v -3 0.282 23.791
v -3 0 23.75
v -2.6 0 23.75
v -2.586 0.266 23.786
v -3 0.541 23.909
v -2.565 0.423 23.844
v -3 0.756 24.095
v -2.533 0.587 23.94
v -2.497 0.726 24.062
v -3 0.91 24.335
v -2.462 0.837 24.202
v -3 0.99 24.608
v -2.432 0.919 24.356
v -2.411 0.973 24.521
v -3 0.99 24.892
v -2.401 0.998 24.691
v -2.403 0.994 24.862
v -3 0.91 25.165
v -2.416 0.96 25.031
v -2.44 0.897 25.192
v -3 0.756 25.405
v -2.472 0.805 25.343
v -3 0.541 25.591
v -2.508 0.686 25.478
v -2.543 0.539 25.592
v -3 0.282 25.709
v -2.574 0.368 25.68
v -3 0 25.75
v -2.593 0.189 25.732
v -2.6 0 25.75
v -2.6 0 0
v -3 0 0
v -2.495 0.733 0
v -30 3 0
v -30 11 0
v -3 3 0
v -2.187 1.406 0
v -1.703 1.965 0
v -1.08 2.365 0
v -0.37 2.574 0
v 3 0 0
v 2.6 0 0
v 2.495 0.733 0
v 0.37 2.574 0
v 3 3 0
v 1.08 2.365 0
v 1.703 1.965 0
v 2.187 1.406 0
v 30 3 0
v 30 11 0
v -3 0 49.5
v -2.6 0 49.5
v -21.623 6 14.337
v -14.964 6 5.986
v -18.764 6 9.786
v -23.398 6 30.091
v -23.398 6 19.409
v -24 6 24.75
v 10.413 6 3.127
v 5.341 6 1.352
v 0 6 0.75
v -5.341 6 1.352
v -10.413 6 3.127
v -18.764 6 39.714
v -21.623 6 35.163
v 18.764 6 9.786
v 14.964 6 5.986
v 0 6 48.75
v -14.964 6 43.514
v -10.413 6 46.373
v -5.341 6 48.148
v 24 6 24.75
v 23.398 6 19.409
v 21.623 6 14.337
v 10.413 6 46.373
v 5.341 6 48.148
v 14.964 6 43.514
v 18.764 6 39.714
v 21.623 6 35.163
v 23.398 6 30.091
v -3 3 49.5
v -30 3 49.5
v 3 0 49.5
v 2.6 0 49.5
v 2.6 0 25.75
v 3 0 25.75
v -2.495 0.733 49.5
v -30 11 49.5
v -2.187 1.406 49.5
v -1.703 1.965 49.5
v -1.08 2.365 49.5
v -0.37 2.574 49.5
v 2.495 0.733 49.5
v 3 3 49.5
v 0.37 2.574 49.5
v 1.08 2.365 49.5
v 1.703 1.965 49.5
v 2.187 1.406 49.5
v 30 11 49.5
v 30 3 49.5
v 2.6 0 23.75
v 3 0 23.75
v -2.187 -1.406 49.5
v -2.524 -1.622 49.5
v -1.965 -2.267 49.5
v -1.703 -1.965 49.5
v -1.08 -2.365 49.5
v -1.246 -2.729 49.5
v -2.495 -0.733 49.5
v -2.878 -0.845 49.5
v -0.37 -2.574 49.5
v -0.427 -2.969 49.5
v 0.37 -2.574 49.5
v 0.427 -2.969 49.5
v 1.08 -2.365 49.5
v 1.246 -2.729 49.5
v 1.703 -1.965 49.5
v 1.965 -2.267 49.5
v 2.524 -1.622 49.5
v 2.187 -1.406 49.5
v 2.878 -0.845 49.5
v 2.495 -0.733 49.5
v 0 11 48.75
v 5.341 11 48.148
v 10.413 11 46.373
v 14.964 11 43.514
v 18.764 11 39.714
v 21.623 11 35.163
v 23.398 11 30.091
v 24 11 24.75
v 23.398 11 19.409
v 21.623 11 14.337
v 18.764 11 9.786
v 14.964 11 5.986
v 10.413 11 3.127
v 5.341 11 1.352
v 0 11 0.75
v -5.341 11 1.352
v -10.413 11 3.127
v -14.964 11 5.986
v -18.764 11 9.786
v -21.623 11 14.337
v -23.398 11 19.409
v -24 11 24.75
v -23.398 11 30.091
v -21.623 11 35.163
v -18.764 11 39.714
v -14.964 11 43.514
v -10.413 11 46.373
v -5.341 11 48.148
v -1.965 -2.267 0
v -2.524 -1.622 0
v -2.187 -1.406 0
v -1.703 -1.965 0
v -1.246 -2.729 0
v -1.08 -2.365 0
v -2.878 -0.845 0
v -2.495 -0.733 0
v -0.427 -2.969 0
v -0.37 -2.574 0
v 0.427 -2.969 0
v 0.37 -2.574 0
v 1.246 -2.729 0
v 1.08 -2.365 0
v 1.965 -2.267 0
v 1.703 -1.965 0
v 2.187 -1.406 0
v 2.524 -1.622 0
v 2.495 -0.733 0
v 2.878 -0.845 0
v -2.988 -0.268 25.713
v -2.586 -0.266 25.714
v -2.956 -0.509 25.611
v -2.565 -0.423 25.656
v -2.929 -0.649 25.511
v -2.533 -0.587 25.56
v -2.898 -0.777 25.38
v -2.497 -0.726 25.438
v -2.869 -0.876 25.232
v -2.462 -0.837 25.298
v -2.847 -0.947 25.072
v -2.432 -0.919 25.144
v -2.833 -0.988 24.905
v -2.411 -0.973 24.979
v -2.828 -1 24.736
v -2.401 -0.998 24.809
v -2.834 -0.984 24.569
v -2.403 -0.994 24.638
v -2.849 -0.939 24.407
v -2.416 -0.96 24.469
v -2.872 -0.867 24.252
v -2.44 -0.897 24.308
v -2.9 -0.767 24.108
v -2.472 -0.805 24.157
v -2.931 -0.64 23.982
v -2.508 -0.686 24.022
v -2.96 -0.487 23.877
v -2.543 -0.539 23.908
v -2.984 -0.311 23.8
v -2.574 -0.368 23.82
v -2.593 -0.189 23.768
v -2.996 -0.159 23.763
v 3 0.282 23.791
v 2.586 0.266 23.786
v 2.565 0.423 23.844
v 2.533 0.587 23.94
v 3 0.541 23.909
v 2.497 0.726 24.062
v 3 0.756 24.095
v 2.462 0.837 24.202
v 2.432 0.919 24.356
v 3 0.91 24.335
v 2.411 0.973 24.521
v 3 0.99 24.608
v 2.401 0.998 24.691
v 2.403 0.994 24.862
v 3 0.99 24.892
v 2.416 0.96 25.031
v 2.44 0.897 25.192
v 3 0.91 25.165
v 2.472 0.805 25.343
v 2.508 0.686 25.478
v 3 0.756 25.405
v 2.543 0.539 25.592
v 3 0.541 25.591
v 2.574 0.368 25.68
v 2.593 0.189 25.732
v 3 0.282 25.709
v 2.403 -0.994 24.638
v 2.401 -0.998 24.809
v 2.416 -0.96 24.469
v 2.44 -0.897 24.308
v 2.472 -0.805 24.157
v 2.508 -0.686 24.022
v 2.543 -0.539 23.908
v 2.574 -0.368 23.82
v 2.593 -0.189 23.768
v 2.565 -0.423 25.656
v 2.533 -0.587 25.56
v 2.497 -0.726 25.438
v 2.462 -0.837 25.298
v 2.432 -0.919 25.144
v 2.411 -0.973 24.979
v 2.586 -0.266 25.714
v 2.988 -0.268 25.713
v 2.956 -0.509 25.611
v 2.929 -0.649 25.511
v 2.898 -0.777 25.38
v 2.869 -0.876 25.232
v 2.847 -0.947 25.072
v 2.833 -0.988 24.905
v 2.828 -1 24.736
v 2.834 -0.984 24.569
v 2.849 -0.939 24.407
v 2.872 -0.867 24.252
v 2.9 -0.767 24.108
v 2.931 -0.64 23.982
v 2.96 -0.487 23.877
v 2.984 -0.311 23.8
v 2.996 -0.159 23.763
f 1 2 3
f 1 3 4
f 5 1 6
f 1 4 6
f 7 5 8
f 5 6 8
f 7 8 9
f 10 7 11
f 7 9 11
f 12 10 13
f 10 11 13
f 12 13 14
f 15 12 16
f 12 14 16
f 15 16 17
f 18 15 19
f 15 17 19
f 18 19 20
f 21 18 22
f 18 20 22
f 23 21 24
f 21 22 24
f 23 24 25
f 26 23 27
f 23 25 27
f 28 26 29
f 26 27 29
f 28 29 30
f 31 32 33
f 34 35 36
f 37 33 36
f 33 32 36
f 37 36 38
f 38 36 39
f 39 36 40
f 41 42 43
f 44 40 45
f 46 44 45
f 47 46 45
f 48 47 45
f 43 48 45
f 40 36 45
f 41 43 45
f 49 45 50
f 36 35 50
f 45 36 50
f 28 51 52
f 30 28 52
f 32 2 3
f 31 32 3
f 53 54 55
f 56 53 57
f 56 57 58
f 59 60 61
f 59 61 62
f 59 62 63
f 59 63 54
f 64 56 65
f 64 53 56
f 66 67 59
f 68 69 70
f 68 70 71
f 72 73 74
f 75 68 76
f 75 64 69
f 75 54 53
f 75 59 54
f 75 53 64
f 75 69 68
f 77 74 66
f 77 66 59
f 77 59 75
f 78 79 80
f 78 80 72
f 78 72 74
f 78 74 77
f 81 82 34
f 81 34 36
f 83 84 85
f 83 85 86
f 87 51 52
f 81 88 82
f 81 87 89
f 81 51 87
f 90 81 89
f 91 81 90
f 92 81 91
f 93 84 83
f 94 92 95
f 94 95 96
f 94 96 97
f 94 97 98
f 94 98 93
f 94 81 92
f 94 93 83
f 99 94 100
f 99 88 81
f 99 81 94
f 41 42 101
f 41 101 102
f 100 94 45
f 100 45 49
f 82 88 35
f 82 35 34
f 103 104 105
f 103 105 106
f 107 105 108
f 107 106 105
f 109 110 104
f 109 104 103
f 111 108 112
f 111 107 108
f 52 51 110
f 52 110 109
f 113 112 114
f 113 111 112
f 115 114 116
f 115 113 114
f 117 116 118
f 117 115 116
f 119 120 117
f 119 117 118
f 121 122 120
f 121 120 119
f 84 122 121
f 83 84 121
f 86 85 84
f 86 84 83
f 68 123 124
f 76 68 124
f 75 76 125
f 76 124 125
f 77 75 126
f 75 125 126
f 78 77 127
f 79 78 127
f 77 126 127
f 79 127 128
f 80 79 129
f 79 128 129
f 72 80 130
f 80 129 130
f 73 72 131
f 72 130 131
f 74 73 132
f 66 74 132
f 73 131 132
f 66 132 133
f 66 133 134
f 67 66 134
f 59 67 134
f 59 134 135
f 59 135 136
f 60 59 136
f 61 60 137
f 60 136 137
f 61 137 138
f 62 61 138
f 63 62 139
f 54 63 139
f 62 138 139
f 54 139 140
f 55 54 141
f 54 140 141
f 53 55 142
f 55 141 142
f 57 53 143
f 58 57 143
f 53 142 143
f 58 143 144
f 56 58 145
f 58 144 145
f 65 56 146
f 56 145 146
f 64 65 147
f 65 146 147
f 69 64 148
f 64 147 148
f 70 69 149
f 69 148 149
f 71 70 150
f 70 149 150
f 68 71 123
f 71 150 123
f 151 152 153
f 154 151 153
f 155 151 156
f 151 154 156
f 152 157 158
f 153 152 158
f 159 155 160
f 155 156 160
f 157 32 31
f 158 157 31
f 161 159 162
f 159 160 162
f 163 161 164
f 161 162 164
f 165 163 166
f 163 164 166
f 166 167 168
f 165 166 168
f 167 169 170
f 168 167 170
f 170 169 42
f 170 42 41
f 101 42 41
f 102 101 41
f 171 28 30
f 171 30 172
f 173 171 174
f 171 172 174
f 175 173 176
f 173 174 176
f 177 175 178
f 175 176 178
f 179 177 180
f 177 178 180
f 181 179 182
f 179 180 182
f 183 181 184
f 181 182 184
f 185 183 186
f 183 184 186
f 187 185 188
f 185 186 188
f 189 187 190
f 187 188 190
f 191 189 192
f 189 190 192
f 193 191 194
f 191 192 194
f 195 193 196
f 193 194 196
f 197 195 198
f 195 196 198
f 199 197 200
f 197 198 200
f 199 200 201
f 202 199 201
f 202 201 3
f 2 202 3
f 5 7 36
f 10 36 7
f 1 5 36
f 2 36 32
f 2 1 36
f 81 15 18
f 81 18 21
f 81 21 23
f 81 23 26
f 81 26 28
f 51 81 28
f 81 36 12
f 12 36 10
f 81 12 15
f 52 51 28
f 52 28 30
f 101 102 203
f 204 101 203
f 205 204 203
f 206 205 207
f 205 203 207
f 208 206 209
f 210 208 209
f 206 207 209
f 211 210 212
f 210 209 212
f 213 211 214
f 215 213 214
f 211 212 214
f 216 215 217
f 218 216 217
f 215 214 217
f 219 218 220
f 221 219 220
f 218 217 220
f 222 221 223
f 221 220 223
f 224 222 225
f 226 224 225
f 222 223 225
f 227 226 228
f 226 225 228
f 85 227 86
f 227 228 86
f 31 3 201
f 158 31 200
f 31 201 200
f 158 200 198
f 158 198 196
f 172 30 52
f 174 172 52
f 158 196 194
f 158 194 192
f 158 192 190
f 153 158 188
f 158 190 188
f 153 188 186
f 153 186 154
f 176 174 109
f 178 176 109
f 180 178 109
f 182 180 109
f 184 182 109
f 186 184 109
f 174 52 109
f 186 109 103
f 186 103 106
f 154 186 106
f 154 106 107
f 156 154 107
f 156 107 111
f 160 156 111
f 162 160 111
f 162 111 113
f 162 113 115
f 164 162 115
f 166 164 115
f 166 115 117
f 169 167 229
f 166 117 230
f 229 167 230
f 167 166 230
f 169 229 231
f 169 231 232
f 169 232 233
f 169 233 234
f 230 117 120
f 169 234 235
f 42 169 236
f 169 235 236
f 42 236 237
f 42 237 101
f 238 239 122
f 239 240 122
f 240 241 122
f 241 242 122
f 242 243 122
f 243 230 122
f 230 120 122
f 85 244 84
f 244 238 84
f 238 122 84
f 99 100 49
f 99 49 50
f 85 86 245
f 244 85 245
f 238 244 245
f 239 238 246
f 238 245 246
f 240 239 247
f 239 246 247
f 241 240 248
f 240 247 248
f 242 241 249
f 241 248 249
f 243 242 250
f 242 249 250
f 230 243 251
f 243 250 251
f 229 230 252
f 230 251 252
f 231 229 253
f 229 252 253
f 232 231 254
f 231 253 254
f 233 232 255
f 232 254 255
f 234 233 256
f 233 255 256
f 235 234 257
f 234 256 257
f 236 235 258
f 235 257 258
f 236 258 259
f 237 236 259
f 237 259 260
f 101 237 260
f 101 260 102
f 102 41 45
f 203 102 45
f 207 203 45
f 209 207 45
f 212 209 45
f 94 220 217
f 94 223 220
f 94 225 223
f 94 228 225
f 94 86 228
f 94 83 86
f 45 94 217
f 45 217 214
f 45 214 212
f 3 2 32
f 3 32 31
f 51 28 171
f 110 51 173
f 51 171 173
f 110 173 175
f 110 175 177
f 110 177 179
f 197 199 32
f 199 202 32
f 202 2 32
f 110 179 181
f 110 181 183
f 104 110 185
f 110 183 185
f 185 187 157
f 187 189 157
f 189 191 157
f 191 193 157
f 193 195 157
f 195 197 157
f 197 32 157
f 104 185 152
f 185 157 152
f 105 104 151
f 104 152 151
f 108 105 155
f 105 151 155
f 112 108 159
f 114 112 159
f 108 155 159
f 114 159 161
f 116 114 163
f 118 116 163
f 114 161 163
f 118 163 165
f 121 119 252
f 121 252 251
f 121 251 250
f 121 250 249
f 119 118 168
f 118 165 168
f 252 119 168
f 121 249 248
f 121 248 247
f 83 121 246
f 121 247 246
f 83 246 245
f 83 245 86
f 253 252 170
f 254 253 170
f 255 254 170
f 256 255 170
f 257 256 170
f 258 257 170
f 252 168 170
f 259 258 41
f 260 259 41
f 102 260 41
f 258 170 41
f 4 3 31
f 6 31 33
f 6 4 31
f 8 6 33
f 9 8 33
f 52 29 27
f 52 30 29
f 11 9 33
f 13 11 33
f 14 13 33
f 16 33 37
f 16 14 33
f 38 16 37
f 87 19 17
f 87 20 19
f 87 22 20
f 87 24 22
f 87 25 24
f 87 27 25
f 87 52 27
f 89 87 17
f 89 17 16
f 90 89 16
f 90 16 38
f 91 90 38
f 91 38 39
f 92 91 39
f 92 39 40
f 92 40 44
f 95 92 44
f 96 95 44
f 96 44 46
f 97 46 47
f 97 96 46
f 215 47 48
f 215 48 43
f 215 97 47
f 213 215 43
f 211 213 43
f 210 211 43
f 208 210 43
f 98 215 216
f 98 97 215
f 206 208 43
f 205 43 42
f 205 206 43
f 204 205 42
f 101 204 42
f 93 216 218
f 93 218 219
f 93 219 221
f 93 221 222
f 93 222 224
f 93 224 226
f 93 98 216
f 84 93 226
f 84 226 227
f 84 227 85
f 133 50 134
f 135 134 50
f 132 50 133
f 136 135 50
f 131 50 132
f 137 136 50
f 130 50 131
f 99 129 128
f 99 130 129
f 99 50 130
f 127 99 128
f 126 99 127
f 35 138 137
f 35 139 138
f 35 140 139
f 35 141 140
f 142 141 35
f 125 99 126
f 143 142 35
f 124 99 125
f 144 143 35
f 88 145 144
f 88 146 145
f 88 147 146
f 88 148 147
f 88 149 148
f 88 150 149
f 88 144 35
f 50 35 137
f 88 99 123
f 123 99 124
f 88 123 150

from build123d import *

# Parameters (mm, degrees)
SKETCH2_R           = 3
BOSS_EXTRUDE1_DEPTH = 49.5
SKETCH4_R           = 2.6
CUT_EXTRUDE1_DEPTH  = 49.5
SKETCH5_W           = 18.579549567
SKETCH5_H           = 4.34209906
CUT_EXTRUDE2_DEPTH  = 49.5
BOSS_EXTRUDE2_DEPTH = 49.5
SKETCH6_R           = 24
CUT_EXTRUDE3_DEPTH  = 5
SKETCH9_R           = 1
CUT_EXTRUDE5_DEPTH  = 10


with BuildPart() as part:
    # Sketch2 → Boss-Extrude1 (new body)
    with BuildSketch(Plane.XY):
        Circle(SKETCH2_R)
    extrude(amount=BOSS_EXTRUDE1_DEPTH)

    # Sketch4 → Cut-Extrude1 (cut)
    with BuildSketch(Plane.XY.offset(49.5)):
        Circle(SKETCH4_R)
    extrude(amount=-CUT_EXTRUDE1_DEPTH, mode=Mode.SUBTRACT)

    # Sketch5 → Cut-Extrude2 (cut)
    with BuildSketch(Plane.XY.offset(49.5)):
        with Locations((3.844372333, 2.17104953)):
            Rectangle(SKETCH5_W, SKETCH5_H)
    extrude(amount=-CUT_EXTRUDE2_DEPTH, mode=Mode.SUBTRACT)


with BuildPart() as body_2:
    # Sketch3 → Boss-Extrude2 (new body)
    with BuildSketch(Plane.XY.offset(49.5)):
        with BuildLine():
            Line((3, 0), (3, 3))
            Line((3, 3), (30, 3))
            Line((30, 3), (30, 11))
            Line((30, 11), (-30, 11))
            Line((-30, 11), (-30, 3))
            Line((-30, 3), (-3, 3))
            Line((-3, 3), (-3, 0))
            Line((-3, 0), (-2.6, 0))
            ThreePointArc((-2.6, 0), (0, 2.6), (2.6, 0))
            Line((2.6, 0), (3, 0))
        make_face()
    extrude(amount=-BOSS_EXTRUDE2_DEPTH)

    # Sketch6 → Cut-Extrude3 (cut)
    with BuildSketch(Plane(origin=(0, 11, 0), x_dir=(1, 0, 0), z_dir=(0, 1, 0))):
        with Locations(Location((0, -24.75, 0), (0, 0, 270))):
            Circle(SKETCH6_R)
    extrude(amount=-CUT_EXTRUDE3_DEPTH, mode=Mode.SUBTRACT)


with BuildPart() as cut_extrude5_tool:
    # Sketch9 → Cut-Extrude5 (new body)
    with BuildSketch(Plane(origin=(3, 0, 0), x_dir=(0, 0, -1), z_dir=(1, 0, 0))):
        with Locations((-24.75, 0)):
            Circle(SKETCH9_R)
    extrude(amount=-CUT_EXTRUDE5_DEPTH)


with BuildPart() as part_1:
    add(part.part)

    # Cut-Extrude5: cut by cut_extrude5_tool
    add(cut_extrude5_tool.part, mode=Mode.SUBTRACT)


with BuildPart() as body_2_1:
    add(body_2.part)

    # Cut-Extrude5: cut by cut_extrude5_tool
    add(cut_extrude5_tool.part, mode=Mode.SUBTRACT)


solid = Compound([part_1.part, body_2_1.part])
